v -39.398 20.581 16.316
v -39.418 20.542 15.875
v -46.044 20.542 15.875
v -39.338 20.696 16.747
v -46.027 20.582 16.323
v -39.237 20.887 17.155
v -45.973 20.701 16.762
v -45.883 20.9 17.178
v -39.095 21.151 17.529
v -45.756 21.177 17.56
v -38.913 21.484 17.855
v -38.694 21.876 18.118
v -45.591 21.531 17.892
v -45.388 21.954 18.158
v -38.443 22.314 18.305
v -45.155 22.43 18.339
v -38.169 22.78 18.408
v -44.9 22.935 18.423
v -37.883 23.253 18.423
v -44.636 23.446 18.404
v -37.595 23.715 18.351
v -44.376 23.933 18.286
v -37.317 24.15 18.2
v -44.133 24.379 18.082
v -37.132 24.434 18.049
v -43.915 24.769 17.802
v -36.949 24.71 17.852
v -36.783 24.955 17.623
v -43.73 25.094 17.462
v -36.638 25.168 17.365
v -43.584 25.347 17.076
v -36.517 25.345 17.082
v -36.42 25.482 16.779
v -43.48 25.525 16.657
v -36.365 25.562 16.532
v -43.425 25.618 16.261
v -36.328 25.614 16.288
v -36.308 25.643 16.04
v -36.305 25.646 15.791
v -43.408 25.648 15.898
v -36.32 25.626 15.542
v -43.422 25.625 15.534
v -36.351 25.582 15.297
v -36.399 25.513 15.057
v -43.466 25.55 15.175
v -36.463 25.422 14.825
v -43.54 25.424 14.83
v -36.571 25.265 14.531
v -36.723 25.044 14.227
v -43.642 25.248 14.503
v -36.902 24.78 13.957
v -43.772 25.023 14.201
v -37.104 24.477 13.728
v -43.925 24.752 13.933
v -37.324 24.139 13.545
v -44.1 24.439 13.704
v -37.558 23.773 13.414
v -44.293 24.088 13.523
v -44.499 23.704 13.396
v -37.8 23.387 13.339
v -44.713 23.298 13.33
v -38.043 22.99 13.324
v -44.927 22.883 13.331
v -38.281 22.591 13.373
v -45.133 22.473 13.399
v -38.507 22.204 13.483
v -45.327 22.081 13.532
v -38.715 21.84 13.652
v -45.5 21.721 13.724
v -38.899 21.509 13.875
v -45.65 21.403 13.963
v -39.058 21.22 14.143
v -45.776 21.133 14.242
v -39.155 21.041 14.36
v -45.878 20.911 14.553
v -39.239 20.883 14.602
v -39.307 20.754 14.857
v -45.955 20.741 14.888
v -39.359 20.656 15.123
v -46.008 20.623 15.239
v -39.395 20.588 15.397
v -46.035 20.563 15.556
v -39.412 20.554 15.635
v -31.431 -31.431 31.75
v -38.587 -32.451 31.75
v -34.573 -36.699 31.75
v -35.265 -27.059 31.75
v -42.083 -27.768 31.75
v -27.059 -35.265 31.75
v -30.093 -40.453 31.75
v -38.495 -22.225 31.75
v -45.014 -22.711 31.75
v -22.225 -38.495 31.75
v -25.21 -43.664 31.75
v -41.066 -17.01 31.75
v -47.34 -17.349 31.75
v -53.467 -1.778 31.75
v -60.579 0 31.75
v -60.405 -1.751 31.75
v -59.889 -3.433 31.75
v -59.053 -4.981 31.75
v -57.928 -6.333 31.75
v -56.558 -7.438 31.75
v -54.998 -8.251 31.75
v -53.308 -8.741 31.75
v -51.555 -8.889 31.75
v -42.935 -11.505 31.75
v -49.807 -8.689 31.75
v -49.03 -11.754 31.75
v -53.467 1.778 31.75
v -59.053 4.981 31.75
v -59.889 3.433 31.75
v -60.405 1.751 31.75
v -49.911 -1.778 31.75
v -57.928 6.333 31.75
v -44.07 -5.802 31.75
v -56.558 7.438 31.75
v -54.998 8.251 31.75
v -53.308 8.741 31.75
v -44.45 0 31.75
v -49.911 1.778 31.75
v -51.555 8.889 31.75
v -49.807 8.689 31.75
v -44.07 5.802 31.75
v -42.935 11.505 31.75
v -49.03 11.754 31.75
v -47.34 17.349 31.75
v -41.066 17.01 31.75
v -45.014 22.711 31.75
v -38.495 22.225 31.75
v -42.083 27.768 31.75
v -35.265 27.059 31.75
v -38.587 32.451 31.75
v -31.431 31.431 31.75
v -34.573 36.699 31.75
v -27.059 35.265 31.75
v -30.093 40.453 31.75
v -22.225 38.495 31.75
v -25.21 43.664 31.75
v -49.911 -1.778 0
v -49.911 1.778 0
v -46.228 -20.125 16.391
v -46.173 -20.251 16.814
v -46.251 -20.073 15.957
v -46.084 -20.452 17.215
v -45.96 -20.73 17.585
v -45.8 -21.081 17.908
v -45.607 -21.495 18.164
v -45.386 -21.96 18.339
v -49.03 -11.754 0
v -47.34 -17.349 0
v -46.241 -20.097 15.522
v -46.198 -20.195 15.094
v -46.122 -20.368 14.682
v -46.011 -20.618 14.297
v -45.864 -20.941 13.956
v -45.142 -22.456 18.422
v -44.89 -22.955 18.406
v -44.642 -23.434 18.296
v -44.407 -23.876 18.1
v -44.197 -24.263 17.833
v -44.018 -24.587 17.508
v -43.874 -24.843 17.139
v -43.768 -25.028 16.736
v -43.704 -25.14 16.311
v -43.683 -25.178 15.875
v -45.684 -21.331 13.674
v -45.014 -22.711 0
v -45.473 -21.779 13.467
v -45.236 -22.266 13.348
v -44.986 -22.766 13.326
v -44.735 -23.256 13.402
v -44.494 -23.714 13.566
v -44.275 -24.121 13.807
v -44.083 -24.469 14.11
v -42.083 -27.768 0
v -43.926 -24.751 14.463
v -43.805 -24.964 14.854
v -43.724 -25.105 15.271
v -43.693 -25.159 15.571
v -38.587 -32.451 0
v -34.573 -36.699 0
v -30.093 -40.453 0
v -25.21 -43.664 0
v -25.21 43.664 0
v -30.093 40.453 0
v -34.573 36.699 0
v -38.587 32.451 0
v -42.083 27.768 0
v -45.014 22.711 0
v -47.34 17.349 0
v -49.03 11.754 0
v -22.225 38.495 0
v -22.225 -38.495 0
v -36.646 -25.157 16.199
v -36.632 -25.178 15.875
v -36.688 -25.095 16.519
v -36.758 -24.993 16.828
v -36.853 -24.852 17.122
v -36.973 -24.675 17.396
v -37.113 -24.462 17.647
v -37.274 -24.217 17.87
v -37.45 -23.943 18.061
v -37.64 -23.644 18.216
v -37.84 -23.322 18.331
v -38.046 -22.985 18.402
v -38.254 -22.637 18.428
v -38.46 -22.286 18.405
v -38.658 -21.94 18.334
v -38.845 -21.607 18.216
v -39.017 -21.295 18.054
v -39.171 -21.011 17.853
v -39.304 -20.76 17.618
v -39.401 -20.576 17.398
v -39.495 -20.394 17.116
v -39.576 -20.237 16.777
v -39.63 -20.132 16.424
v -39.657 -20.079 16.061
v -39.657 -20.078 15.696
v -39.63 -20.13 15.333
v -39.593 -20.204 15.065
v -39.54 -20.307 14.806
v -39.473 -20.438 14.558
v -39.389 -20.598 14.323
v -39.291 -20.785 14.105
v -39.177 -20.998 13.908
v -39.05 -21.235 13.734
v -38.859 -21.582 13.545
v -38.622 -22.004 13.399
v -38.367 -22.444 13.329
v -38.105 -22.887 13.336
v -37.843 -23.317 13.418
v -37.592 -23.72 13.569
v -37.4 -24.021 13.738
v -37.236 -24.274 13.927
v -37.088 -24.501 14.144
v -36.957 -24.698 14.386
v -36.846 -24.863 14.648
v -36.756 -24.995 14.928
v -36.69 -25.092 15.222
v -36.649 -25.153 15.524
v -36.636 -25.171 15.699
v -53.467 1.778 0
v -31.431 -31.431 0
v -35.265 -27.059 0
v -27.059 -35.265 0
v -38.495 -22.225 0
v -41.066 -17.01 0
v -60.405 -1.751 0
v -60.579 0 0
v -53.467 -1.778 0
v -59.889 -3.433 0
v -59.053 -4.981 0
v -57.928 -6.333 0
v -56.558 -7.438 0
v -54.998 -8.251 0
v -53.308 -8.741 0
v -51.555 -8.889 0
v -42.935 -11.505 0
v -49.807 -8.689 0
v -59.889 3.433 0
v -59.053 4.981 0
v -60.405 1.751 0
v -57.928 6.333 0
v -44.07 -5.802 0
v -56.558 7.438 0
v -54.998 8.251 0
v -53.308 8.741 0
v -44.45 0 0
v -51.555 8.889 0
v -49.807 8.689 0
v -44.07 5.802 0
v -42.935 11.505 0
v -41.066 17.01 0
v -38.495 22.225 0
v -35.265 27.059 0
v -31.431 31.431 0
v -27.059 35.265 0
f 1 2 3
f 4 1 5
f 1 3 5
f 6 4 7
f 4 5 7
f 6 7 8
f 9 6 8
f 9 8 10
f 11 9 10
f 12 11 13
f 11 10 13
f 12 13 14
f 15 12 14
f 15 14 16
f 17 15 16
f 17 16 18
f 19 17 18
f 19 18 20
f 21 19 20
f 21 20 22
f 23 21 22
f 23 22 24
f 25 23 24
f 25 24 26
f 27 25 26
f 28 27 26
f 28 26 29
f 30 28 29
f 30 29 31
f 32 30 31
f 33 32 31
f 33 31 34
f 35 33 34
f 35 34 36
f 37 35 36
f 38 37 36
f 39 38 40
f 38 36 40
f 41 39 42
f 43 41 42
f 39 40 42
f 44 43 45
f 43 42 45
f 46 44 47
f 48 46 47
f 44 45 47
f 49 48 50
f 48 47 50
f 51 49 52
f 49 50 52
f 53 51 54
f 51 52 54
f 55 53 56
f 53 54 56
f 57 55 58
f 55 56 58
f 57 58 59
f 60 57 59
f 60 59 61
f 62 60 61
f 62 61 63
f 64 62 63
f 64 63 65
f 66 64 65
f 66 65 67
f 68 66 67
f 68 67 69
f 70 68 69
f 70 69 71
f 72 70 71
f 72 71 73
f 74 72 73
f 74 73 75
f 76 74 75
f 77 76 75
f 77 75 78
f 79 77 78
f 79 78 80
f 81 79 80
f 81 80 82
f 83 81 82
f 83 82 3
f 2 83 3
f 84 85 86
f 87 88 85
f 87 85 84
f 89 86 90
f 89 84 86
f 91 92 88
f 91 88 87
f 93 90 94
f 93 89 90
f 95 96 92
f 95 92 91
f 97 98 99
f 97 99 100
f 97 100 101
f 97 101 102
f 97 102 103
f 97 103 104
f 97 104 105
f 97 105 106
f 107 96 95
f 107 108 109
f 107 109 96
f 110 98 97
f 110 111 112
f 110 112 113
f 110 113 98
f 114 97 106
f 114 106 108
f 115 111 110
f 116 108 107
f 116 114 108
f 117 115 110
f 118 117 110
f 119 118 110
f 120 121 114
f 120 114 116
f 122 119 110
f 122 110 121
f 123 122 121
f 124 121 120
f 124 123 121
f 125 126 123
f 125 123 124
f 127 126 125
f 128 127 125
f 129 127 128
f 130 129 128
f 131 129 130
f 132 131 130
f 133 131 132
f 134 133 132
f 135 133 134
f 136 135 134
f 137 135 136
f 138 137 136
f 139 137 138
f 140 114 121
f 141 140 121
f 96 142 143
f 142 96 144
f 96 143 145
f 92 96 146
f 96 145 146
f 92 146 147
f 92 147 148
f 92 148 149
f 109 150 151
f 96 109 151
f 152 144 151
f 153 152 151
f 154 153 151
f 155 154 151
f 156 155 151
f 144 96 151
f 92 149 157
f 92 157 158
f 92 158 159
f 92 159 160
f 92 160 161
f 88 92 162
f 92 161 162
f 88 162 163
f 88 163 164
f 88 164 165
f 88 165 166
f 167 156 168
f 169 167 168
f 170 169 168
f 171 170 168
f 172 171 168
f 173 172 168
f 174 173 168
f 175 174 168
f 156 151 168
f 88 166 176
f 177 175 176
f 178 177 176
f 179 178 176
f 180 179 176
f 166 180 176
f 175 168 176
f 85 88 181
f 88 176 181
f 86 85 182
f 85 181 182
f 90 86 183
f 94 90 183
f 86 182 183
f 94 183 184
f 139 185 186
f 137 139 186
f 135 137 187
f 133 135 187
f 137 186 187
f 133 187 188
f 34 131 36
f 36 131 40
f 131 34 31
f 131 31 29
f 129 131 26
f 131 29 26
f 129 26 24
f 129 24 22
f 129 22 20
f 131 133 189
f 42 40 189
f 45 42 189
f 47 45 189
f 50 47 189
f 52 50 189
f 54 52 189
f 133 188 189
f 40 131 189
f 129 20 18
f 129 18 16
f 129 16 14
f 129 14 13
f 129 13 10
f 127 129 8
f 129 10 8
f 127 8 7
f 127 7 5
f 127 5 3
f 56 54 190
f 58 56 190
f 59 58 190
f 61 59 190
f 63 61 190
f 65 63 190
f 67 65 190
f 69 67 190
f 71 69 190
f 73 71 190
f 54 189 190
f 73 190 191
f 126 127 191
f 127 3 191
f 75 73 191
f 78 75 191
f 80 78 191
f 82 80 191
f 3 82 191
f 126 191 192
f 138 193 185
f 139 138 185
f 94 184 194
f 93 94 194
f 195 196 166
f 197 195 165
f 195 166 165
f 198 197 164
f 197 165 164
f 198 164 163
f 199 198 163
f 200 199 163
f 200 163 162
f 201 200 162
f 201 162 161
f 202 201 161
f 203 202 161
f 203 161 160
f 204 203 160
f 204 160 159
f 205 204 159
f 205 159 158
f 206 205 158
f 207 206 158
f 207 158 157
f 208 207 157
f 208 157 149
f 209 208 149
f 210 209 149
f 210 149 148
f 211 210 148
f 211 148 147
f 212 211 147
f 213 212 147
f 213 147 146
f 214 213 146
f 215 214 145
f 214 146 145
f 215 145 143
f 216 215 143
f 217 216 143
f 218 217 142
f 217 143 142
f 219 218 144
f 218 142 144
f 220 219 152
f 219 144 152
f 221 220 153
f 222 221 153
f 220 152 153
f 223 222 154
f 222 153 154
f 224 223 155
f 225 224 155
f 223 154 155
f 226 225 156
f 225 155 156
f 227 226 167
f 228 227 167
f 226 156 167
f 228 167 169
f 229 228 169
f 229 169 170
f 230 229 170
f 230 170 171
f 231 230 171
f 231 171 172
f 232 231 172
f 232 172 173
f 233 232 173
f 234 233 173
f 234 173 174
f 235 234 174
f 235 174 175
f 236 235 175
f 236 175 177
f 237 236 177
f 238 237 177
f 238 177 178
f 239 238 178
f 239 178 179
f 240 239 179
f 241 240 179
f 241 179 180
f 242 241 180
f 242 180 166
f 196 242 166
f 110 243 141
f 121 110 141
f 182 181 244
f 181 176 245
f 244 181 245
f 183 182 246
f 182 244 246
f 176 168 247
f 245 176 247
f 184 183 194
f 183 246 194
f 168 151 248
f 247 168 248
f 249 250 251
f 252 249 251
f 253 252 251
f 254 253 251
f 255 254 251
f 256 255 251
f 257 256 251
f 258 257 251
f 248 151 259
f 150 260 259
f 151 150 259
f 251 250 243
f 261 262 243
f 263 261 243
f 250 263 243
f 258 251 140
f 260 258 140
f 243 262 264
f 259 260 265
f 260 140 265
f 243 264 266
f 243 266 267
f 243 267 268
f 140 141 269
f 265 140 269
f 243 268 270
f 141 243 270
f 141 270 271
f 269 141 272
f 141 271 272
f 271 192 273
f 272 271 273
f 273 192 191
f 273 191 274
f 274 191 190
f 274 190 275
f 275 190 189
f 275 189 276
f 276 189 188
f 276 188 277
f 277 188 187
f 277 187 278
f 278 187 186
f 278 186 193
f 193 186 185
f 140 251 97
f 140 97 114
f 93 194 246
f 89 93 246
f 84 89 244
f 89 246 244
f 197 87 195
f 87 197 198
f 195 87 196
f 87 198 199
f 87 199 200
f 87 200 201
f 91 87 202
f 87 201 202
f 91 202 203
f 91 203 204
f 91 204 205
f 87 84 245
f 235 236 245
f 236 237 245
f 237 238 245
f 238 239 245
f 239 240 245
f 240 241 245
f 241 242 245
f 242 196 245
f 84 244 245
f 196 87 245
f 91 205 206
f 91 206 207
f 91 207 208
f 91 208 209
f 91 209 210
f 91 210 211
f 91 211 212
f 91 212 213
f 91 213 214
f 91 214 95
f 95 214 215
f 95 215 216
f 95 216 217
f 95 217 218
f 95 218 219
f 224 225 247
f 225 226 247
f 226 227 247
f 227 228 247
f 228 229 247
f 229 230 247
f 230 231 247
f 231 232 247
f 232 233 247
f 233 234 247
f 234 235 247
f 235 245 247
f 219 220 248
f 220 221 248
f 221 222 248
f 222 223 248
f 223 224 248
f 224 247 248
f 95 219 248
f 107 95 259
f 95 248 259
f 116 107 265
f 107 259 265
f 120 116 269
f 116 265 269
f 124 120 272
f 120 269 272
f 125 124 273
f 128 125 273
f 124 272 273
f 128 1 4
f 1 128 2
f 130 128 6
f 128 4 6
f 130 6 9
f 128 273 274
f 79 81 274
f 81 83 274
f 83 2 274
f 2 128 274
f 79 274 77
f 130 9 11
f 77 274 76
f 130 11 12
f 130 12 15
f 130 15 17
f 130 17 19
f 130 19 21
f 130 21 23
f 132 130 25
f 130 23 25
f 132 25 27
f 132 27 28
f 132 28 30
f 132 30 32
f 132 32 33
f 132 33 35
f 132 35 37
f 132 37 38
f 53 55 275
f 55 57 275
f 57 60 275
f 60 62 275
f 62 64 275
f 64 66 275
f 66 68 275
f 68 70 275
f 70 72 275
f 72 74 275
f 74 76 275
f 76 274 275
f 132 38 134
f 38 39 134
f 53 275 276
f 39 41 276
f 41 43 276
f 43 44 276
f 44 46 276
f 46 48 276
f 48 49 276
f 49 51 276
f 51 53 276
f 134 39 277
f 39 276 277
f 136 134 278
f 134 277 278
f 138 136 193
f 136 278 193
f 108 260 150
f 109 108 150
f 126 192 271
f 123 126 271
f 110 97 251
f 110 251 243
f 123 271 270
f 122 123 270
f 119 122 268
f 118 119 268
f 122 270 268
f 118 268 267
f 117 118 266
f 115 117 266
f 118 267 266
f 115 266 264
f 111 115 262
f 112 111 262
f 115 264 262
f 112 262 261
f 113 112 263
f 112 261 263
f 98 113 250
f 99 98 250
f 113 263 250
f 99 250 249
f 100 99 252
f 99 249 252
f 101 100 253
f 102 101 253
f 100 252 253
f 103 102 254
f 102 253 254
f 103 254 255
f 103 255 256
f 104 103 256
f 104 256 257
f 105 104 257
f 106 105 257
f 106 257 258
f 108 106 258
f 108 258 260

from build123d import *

# Parameters (mm, degrees)
F0_R     = 1.27
F1_DEPTH = 31.75
F2_W     = 3.556
F2_H     = 3.556
F2_R     = 1.27
F3_DEPTH = 31.75
F5_D     = 5.1054


with BuildPart() as f1:
    # F0 (on Top) → F1 (new body)
    with BuildSketch(Plane.XY):
        with BuildLine():
            ThreePointArc((-22.225, -38.494829), (-44.45, 0), (-22.225, 38.494829))
            Line((-22.225, 38.494829), (-25.2095, 43.664135))
            ThreePointArc((-25.2095, 43.664135), (-40.403306, 30.160378), (-49.029733, 11.754185))
            Line((-49.029733, 11.754185), (-49.807311, 8.688576))
            ThreePointArc((-49.807311, 8.688576), (-60.579, 0), (-49.807311, -8.688576))
            Line((-49.807311, -8.688576), (-49.029733, -11.754185))
            ThreePointArc((-49.029733, -11.754185), (-40.403306, -30.160378), (-25.2095, -43.664135))
            Line((-25.2095, -43.664135), (-22.225, -38.494829))
        make_face()
        with Locations((-51.689, 0)):
            Circle(F0_R, mode=Mode.SUBTRACT)
    extrude(amount=F1_DEPTH)

    # F2 (on face) → F3 (cut, through all)
    with BuildSketch(Plane.XY.offset(31.75)):
        with Locations((-51.689, 0)):
            Rectangle(F2_W, F2_H)
        with Locations((-51.689, 0)):
            Circle(F2_R, mode=Mode.SUBTRACT)
    extrude(amount=-F3_DEPTH, mode=Mode.SUBTRACT)

    # F5 (through all)
    with Locations(Plane.YZ):
        with Locations((-22.624822, 15.875), (23.095178, 15.875)):
            Hole(F5_D / 2)


solid = f1.part
